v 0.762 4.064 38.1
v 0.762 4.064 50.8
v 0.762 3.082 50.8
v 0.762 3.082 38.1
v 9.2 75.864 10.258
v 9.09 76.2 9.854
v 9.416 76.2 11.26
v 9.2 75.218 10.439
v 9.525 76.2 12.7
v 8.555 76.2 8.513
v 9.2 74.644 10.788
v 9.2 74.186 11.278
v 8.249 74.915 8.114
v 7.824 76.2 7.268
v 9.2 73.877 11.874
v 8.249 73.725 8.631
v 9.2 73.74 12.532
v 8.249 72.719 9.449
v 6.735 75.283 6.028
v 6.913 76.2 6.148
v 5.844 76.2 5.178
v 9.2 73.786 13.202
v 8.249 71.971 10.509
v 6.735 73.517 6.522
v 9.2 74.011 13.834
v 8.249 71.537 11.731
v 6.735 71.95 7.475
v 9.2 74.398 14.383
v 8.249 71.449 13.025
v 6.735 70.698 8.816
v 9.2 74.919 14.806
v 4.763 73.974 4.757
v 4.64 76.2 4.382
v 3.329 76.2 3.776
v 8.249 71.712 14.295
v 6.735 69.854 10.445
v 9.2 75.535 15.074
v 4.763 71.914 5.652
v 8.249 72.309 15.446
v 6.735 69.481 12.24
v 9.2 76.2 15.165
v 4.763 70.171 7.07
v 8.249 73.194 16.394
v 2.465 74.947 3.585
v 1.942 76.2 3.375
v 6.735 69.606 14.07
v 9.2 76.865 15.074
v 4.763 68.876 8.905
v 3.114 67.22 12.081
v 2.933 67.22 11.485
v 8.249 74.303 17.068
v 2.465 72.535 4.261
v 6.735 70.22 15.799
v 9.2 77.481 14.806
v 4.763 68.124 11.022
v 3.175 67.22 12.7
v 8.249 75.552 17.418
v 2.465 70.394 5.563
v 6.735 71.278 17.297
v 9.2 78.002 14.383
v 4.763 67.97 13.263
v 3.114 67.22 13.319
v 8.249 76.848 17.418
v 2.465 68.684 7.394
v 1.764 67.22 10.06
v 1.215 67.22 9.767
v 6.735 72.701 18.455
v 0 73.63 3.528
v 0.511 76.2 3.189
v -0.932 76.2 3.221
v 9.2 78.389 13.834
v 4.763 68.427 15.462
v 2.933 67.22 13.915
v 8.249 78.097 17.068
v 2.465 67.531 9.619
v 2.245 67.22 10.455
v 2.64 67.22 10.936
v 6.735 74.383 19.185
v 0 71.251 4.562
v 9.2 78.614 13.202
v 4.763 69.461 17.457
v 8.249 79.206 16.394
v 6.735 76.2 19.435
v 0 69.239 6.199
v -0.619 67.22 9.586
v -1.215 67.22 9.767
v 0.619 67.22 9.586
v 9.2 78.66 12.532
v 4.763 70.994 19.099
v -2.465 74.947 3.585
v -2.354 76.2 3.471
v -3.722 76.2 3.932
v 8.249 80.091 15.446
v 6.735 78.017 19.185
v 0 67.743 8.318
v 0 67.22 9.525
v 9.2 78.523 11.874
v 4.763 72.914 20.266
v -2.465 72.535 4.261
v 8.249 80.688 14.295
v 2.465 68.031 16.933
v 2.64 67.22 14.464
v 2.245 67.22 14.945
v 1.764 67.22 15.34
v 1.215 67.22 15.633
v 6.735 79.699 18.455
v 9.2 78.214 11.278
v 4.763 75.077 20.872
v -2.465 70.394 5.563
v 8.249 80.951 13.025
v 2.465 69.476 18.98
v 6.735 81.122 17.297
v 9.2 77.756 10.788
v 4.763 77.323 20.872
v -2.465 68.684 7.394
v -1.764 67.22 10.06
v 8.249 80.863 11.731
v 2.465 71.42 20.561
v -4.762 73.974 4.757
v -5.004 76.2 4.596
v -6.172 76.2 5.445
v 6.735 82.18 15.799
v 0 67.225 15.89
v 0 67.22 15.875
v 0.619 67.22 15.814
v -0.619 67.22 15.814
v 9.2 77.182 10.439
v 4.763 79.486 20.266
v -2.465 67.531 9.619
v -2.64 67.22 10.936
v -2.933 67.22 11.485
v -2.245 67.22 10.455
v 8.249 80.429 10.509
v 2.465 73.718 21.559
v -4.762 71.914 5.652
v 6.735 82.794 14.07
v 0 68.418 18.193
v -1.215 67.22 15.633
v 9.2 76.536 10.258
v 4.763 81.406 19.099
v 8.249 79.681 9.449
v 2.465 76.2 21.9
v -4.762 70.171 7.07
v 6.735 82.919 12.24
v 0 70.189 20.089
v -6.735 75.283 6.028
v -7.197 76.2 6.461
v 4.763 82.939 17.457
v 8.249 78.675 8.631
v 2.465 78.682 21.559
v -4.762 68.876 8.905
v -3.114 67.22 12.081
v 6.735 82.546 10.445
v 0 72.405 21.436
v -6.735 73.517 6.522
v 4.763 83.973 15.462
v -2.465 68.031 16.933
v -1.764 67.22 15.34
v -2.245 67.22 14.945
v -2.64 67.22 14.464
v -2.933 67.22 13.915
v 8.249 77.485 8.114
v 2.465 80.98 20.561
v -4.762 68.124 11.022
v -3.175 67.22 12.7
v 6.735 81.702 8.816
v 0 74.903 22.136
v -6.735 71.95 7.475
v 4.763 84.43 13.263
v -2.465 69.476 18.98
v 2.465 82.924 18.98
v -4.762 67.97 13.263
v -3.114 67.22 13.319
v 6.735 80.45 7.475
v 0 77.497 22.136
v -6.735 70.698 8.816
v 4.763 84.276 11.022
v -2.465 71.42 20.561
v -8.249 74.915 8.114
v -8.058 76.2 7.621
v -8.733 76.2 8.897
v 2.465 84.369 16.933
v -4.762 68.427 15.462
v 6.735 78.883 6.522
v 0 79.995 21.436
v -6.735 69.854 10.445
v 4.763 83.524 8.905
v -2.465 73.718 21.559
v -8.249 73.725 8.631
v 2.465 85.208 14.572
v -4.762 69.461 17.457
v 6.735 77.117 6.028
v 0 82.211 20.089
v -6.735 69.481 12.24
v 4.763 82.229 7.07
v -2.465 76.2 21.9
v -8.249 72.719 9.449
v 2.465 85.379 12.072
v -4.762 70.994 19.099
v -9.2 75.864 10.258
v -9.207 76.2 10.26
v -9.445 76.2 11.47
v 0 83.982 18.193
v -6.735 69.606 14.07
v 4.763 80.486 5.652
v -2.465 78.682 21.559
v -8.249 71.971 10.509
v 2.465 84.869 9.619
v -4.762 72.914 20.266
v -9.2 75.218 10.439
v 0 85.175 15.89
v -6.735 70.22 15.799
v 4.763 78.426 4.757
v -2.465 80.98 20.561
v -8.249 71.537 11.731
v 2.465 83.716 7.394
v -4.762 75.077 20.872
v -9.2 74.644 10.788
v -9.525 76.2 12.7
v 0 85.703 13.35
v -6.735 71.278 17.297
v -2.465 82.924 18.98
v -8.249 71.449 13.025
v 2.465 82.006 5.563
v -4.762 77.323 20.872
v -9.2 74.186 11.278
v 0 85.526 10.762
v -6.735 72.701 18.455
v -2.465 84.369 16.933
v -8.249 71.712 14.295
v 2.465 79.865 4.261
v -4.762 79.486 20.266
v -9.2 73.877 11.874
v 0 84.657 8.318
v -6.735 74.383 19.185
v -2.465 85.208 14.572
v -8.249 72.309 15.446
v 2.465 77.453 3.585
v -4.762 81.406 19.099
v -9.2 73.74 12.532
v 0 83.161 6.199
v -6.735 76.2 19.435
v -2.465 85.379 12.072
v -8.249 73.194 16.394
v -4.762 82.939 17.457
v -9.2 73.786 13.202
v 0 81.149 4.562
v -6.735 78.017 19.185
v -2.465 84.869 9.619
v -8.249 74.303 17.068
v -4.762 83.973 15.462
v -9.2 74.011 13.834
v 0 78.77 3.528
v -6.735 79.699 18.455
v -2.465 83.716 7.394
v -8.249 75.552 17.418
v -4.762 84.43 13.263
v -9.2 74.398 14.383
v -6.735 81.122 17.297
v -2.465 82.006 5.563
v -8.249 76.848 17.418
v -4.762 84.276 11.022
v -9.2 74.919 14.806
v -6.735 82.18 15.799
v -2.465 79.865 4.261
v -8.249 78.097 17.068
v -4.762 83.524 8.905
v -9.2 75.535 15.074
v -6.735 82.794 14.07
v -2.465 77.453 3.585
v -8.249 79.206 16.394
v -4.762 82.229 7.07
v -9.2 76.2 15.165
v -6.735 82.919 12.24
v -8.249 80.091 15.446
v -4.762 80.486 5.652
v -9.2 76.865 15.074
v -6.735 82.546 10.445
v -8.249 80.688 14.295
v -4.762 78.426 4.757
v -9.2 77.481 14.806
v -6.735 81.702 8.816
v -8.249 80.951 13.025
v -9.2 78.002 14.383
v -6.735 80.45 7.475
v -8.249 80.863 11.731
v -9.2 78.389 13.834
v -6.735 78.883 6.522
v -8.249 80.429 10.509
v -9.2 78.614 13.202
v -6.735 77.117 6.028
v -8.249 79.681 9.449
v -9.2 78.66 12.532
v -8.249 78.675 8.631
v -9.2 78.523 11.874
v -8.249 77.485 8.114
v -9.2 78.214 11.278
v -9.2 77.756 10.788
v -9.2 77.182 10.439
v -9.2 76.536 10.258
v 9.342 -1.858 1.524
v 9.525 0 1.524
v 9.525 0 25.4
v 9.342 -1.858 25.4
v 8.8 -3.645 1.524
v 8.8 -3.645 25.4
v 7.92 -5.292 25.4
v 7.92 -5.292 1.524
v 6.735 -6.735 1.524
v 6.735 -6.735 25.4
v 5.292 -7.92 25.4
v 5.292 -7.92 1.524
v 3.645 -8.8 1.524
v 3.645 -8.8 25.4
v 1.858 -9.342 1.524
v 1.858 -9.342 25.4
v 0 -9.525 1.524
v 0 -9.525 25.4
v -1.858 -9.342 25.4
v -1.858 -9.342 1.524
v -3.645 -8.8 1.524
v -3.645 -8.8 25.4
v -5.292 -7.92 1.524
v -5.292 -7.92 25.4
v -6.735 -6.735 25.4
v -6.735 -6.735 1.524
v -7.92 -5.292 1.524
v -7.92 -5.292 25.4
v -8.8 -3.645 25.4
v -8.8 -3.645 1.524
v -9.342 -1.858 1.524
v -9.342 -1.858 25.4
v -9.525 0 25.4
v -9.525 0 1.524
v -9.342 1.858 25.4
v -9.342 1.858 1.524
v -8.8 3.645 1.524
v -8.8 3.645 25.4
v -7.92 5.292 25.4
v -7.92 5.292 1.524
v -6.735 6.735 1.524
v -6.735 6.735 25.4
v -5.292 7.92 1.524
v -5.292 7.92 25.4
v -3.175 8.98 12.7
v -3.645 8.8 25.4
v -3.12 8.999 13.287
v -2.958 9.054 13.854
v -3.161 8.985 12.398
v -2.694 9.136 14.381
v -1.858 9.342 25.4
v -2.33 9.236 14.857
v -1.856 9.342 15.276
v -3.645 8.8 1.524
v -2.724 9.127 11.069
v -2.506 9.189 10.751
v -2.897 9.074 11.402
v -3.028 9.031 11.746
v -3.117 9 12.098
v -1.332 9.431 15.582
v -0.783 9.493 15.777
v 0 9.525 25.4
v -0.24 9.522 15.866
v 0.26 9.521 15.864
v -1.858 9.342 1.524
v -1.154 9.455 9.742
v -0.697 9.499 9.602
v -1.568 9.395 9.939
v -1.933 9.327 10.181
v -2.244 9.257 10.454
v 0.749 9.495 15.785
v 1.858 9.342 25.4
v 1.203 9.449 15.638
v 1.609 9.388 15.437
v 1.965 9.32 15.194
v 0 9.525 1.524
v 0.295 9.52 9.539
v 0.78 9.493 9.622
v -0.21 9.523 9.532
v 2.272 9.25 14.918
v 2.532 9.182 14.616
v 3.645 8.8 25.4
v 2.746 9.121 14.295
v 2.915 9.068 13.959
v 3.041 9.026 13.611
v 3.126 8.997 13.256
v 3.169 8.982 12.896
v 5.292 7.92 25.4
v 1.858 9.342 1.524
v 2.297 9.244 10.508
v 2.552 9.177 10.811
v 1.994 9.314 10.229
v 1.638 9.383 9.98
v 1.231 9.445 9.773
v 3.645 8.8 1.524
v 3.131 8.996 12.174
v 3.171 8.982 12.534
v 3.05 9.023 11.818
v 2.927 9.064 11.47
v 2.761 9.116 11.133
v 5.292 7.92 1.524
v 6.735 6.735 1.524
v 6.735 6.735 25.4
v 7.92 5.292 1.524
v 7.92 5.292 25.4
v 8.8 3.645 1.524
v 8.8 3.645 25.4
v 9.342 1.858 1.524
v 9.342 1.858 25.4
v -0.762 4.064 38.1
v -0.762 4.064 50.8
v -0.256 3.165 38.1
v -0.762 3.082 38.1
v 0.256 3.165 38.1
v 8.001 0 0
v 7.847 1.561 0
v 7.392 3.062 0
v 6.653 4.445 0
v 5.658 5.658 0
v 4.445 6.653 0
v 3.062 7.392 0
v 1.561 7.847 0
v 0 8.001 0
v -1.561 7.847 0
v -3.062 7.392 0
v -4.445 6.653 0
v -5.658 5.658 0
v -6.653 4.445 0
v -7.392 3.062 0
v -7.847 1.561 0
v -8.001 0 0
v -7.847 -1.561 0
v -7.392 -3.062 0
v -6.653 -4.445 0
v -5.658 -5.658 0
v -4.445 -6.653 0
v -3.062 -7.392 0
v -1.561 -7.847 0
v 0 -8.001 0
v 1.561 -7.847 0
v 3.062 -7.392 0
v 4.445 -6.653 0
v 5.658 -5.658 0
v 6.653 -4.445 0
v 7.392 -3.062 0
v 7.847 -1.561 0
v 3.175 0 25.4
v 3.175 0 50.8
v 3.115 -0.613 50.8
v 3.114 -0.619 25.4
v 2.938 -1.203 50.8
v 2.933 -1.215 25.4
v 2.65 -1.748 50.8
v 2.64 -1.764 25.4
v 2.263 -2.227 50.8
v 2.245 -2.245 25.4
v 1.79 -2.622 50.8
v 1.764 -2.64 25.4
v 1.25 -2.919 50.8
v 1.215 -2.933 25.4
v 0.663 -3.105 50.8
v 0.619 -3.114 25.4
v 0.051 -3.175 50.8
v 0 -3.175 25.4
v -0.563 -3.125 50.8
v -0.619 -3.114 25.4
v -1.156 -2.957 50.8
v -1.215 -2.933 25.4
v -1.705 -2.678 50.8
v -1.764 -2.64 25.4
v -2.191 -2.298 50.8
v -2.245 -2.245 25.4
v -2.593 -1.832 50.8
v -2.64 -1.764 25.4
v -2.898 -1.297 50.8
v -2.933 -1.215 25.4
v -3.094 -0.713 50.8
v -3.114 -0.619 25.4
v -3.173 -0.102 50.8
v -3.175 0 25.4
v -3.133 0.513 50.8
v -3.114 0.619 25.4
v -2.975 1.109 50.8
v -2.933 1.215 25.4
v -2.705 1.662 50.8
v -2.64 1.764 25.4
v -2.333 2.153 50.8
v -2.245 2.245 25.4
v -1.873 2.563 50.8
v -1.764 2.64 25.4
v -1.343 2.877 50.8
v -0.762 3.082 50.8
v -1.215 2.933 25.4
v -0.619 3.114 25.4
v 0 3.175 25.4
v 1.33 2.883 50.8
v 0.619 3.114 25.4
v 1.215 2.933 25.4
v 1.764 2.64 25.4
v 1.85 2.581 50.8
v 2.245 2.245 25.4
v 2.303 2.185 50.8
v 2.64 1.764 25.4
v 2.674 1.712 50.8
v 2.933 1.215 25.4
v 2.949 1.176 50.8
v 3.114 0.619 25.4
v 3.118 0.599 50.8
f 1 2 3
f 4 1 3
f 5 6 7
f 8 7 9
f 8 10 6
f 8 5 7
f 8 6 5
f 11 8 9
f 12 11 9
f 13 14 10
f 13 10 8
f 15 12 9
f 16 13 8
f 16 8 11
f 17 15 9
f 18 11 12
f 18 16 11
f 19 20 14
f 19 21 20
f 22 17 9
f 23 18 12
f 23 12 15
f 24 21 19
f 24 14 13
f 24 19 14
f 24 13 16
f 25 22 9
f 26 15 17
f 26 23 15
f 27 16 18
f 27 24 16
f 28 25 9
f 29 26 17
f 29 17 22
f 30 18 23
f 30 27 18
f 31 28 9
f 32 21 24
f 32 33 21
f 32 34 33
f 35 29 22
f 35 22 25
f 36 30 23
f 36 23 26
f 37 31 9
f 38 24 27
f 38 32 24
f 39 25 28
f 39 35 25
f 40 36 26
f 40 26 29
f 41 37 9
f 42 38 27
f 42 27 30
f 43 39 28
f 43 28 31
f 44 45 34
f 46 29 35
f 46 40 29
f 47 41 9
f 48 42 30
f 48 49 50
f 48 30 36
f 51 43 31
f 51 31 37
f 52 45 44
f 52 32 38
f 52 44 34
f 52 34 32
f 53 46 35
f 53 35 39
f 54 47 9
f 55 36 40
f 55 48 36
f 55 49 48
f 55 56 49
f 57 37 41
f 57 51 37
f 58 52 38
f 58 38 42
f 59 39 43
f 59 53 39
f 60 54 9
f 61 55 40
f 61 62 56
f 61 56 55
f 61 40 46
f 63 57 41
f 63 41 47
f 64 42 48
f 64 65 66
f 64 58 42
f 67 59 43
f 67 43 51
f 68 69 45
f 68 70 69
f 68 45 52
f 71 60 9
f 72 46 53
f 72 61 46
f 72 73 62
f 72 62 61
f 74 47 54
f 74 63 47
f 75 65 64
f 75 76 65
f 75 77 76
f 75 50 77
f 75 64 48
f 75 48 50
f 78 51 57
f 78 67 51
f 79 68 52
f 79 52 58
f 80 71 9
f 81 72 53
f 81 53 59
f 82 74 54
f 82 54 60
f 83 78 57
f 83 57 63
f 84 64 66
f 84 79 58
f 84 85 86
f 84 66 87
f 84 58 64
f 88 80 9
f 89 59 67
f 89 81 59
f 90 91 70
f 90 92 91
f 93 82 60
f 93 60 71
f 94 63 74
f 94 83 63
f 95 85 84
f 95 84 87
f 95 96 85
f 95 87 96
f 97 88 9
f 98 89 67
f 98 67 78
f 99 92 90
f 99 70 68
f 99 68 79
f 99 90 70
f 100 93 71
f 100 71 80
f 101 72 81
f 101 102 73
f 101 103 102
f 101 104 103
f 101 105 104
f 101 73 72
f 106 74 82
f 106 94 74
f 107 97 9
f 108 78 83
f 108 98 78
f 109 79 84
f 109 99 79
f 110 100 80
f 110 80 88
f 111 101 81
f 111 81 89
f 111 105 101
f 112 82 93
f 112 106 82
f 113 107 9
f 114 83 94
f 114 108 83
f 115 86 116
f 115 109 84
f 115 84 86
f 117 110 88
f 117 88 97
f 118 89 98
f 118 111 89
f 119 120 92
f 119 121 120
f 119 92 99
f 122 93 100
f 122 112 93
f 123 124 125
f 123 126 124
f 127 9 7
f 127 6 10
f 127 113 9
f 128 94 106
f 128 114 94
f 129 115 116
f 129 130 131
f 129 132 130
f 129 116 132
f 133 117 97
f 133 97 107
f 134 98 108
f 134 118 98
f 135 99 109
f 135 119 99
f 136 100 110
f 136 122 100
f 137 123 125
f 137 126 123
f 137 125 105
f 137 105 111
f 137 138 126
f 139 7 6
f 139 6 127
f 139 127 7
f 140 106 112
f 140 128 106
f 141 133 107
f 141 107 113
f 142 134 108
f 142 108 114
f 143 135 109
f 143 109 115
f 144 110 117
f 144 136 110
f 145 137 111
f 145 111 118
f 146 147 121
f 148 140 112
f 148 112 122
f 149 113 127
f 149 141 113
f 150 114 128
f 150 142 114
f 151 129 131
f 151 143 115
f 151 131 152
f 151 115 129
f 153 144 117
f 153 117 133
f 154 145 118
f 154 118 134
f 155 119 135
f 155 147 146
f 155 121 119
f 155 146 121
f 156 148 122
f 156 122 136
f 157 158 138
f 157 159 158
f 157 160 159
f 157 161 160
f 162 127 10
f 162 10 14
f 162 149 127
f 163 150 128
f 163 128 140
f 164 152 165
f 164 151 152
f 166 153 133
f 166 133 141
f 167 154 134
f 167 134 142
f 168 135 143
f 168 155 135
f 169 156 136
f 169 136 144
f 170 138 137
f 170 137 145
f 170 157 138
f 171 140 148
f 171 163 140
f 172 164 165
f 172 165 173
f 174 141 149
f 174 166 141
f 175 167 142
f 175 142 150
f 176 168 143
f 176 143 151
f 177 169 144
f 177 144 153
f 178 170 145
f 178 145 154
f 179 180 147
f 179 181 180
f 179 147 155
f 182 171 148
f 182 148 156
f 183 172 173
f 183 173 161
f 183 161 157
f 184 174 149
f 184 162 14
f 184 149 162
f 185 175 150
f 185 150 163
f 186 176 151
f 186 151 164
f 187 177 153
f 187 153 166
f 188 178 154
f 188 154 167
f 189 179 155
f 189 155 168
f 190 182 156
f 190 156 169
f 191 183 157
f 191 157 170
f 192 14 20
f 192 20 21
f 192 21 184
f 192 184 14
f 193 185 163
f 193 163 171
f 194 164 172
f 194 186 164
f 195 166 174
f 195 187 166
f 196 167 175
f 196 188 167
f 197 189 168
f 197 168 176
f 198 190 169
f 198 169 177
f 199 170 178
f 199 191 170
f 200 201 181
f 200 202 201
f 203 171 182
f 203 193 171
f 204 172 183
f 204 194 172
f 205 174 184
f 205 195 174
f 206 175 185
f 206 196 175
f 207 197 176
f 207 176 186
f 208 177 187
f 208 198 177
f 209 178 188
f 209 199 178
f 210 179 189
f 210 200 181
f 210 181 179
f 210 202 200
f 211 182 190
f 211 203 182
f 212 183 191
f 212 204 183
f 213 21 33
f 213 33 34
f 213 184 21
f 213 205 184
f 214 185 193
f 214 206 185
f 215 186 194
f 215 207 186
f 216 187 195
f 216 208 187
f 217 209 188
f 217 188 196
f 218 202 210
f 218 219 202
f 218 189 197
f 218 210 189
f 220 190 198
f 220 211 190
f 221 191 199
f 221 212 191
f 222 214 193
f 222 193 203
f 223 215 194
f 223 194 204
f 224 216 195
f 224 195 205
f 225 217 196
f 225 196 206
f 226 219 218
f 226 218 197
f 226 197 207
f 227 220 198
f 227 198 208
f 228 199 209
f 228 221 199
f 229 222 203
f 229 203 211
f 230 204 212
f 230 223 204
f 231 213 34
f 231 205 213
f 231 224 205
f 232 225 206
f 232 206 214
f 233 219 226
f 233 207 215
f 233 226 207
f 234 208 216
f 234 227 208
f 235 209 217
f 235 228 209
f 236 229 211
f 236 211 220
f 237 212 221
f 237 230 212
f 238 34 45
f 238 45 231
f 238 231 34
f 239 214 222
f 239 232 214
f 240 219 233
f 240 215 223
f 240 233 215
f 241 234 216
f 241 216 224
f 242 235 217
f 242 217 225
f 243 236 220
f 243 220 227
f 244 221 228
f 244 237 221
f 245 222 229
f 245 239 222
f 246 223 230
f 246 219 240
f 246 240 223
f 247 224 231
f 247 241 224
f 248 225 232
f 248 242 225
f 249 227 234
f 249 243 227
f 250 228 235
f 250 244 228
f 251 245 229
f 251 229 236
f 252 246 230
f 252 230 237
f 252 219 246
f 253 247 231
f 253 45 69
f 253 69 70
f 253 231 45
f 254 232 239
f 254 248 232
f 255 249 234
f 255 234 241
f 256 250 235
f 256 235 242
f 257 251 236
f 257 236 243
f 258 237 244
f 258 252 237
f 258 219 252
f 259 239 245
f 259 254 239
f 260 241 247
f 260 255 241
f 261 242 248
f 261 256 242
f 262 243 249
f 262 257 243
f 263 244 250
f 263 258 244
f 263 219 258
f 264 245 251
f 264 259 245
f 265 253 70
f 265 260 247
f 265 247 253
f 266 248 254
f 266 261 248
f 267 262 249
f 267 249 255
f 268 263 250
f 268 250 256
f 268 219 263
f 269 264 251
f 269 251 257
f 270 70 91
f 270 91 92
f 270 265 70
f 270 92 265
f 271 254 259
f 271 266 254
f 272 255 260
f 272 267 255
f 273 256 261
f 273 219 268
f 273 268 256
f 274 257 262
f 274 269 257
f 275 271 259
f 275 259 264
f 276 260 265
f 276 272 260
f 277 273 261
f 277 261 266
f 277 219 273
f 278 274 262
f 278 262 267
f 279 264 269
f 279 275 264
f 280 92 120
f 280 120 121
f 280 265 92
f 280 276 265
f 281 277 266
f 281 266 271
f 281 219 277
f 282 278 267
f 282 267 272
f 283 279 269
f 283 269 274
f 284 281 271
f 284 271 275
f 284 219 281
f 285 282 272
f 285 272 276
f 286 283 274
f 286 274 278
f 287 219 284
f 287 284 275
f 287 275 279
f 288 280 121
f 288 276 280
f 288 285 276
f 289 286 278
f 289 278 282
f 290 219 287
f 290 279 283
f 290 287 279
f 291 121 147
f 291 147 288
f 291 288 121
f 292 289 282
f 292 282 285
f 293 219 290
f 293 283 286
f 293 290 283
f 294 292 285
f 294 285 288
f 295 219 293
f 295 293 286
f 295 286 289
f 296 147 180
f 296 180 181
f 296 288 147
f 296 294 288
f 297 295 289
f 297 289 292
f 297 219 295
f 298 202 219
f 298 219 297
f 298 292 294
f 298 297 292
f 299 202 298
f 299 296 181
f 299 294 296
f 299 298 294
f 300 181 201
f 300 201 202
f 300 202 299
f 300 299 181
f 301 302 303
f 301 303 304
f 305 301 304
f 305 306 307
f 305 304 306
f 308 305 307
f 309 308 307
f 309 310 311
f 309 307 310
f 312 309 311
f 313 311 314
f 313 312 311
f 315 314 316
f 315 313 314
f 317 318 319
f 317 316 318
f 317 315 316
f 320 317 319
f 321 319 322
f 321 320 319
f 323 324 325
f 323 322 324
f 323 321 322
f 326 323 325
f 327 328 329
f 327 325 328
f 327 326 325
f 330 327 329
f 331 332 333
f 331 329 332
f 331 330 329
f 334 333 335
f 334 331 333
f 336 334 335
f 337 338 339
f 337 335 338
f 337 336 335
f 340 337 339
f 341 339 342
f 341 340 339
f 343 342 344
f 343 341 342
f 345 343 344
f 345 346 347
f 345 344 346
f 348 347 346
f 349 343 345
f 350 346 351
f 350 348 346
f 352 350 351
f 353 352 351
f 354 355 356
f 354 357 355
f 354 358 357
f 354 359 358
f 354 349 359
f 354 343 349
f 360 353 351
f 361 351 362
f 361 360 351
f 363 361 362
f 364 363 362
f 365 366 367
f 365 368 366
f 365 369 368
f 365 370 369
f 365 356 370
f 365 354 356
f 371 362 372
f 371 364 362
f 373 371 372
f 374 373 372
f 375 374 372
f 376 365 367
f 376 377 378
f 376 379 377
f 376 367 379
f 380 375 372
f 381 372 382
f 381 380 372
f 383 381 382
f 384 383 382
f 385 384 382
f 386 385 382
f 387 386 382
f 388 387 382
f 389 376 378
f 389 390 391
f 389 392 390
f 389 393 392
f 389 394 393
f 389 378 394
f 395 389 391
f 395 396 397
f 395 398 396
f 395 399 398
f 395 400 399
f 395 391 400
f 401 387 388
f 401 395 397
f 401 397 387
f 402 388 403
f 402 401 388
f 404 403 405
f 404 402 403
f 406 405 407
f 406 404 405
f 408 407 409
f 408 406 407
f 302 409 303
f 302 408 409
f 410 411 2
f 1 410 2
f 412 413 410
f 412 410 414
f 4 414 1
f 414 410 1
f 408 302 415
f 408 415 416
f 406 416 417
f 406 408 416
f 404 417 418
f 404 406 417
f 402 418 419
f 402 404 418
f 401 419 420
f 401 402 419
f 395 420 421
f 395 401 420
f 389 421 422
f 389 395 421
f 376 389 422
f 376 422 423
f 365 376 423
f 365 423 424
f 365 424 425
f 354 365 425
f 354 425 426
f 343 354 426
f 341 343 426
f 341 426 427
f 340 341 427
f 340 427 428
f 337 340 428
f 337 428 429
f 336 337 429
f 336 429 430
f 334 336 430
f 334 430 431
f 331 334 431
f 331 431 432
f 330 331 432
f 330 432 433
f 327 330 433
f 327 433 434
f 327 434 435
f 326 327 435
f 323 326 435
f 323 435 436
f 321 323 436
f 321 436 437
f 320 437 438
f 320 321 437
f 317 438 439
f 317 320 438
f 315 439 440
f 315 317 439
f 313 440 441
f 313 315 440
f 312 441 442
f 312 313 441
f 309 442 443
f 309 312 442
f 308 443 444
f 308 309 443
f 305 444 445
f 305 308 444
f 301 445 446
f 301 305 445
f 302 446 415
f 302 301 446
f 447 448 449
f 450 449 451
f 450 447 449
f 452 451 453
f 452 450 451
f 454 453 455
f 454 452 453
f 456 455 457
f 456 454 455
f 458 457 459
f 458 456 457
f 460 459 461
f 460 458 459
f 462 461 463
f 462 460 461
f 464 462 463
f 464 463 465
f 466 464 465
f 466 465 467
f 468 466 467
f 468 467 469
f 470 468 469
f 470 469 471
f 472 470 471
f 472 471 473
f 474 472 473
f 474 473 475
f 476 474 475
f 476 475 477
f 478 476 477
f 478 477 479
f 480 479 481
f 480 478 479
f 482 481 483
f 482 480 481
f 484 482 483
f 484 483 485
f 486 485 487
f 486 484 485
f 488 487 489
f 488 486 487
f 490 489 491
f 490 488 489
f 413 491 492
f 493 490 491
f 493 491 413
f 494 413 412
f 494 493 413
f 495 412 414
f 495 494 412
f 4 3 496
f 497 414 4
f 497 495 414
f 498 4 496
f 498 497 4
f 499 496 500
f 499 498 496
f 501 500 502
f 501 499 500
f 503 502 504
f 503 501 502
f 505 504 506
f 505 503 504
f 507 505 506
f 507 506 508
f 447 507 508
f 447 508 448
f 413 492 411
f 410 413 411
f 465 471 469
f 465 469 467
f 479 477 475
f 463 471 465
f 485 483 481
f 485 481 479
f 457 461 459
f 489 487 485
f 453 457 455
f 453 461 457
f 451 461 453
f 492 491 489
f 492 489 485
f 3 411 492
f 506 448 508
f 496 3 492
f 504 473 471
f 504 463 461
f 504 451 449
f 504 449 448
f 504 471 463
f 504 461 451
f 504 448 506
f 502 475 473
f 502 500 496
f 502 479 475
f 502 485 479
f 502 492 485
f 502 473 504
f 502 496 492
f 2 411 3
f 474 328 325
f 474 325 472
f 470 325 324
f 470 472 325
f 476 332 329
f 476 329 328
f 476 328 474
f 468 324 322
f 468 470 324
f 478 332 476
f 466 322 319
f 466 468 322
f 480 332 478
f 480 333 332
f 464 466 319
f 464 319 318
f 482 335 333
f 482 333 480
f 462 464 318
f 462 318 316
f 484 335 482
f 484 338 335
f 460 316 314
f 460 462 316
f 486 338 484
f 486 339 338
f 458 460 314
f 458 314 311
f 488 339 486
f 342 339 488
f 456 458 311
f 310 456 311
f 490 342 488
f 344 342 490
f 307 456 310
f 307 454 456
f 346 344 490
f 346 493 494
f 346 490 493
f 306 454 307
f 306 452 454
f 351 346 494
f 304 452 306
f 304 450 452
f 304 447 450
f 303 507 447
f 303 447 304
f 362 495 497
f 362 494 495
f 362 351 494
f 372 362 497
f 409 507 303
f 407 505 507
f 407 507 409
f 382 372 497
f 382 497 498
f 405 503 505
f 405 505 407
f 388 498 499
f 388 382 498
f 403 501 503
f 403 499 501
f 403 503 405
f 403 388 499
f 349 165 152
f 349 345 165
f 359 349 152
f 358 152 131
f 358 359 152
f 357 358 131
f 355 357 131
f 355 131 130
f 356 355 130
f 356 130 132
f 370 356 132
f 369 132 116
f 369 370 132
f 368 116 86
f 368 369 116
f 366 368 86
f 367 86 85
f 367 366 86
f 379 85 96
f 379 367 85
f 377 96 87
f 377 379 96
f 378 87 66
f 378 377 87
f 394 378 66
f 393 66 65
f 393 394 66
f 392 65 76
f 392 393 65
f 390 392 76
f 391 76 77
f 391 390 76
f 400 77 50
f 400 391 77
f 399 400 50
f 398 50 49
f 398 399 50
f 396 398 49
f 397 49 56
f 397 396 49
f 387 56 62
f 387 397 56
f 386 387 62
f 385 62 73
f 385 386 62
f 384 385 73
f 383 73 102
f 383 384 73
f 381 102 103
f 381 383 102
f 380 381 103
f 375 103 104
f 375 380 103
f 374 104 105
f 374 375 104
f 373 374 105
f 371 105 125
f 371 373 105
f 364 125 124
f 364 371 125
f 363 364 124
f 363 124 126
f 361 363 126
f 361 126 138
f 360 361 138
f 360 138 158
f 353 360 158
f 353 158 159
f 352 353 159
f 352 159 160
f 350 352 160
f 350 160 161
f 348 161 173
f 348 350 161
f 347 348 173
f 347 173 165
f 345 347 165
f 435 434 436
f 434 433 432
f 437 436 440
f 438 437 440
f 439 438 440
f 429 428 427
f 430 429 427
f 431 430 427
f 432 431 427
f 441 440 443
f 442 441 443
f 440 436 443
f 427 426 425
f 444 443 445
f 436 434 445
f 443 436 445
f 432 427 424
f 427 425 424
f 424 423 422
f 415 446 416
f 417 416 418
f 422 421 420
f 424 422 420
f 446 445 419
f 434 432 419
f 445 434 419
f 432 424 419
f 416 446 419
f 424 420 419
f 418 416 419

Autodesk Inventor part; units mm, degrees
ref_plane "YZ Plane" through (0, 0, 0) normal (1, 0, 0) x (0, 1, 0)
ref_plane "XZ Plane" through (0, 0, 0) normal (0, 1, 0) x (-1, 0, 0)
ref_plane "XY Plane" through (0, 0, 0) normal (0, 0, 1) x (1, 0, 0)
sketch "Sketch1" plane through (0, 0, 0) normal (0, 0, 1) x (1, 0, 0)
  circle A0 centre (0, 0) radius 9.525
  dimension "d0" = 19.05
extrude "Extrusion1" add sketch "Sketch1" along normal blind 25.4
sketch "Sketch2" plane through (0, 0, 25.4) normal (0, 0, 1) x (1, 0, 0)
  circle A0 centre (0, 0) radius 3.175
  dimension "d3" = 6.35
extrude "Extrusion2" add sketch "Sketch2" along normal blind 25.4
sketch "Sketch3" plane through (0, 0, 50.8) normal (0, 0, 1) x (1, 0, 0)
  line L0 (-0.762, 4.064) -> (0.762, 4.064)
  line L1 (0.762, 4.064) -> (0.762, 2.2428)
  line L2 (0.762, 2.2428) -> (-0.762, 2.2428)
  line L3 (-0.762, 2.2428) -> (-0.762, 4.064)
  point P0 (0, 0)
  dimension "d6" = 4.064
  dimension "d7" = 0.762
  dimension "d8" = 1.524
extrude "Extrusion3" add sketch "Sketch3" against normal blind 12.7
sketch "Sketch4" plane through (0, 0, 0) normal (0, 1, 0) x (-1, 0, 0)
  line L0 (-9.525, 0) -> (-9.525, 25.4) projected
  line L1 (-9.525, 25.4) -> (-3.175, 25.4) projected
  line L2 (-3.175, 25.4) -> (-3.175, 50.8) projected
  line L3 (-3.175, 50.8) -> (3.175, 50.8) projected
  line L4 (3.175, 50.8) -> (3.175, 25.4) projected
  line L5 (3.175, 25.4) -> (9.525, 25.4) projected
  line L6 (9.525, 25.4) -> (9.525, 0) projected
  line L7 (9.525, 0) -> (-9.525, 0) projected
  circle A0 centre (0, 12.7) radius 3.175
  point P0 (0, 0)
  dimension "d11" = 6.35
  dimension "d12" = 12.7
  dimension "d13" = 9.525
extrude "Extrusion4" add sketch "Sketch4" along normal blind 76.2 contours A0
sketch "Sketch5" plane through (0, 76.2, 12.7) normal (0, 1, 0) x (1, 0, 0)
  arc A0 (9.525, 0) -> (-9.525, 0) centre (0, 0) ccw
  line L0 (-9.525, 0) -> (9.525, 0)
  line L1 (9.525, 12.7) -> (9.525, -12.7) projected
  point P0 (0, 12.7)
  dimension "d16" = 19.05
revolve "Revolution1" add sketch "Sketch5" angle 360 about axis through (-9.525, 76.2, 12.7) along (1, 0, 0)
chamfer "Chamfer1" distance 1.524 angle 45 1 edges at (-9.525, 0, 0)
properties part number "Handle" material "Stainless Steel"
